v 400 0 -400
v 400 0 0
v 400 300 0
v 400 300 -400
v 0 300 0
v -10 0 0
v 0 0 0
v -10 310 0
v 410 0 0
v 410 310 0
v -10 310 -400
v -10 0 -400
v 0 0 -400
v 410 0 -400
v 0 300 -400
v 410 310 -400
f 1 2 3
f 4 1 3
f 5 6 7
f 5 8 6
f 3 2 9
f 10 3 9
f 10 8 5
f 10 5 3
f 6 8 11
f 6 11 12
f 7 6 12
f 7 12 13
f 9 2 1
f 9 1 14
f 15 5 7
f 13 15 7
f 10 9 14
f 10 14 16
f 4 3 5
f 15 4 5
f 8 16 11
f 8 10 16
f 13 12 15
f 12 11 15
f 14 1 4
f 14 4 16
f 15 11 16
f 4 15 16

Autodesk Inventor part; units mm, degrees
ref_plane "YZ Plane" through (0, 0, 0) normal (1, 0, 0) x (0, 1, 0)
ref_plane "XZ Plane" through (0, 0, 0) normal (0, 1, 0) x (-1, 0, 0)
ref_plane "XY Plane" through (0, 0, 0) normal (0, 0, 1) x (1, 0, 0)
sketch "Sketch1" plane through (0, 0, 0) normal (0, 0, 1) x (1, 0, 0)
  line L0 (0, 0) -> (400, 0)
  line L1 (400, 0) -> (400, 300)
  line L2 (400, 300) -> (0, 300)
  line L3 (0, 300) -> (0, 0)
  line L4 (0, 0) -> (-10, 0)
  line L5 (-10, 0) -> (410, 0)
  line L6 (410, 0) -> (410, 310)
  line L7 (410, 310) -> (-10, 310)
  line L8 (-10, 310) -> (-10, 0)
  dimension "d0" = 400
  dimension "d1" = 300
  dimension "d4" = 10
extrude "Extrusion1" add sketch "Sketch1" against normal blind 400
extrude "Extrusion2" cut sketch "Sketch1" against normal blind 400 contours L3 L2 L1 L0
properties part number "Tunnel"
